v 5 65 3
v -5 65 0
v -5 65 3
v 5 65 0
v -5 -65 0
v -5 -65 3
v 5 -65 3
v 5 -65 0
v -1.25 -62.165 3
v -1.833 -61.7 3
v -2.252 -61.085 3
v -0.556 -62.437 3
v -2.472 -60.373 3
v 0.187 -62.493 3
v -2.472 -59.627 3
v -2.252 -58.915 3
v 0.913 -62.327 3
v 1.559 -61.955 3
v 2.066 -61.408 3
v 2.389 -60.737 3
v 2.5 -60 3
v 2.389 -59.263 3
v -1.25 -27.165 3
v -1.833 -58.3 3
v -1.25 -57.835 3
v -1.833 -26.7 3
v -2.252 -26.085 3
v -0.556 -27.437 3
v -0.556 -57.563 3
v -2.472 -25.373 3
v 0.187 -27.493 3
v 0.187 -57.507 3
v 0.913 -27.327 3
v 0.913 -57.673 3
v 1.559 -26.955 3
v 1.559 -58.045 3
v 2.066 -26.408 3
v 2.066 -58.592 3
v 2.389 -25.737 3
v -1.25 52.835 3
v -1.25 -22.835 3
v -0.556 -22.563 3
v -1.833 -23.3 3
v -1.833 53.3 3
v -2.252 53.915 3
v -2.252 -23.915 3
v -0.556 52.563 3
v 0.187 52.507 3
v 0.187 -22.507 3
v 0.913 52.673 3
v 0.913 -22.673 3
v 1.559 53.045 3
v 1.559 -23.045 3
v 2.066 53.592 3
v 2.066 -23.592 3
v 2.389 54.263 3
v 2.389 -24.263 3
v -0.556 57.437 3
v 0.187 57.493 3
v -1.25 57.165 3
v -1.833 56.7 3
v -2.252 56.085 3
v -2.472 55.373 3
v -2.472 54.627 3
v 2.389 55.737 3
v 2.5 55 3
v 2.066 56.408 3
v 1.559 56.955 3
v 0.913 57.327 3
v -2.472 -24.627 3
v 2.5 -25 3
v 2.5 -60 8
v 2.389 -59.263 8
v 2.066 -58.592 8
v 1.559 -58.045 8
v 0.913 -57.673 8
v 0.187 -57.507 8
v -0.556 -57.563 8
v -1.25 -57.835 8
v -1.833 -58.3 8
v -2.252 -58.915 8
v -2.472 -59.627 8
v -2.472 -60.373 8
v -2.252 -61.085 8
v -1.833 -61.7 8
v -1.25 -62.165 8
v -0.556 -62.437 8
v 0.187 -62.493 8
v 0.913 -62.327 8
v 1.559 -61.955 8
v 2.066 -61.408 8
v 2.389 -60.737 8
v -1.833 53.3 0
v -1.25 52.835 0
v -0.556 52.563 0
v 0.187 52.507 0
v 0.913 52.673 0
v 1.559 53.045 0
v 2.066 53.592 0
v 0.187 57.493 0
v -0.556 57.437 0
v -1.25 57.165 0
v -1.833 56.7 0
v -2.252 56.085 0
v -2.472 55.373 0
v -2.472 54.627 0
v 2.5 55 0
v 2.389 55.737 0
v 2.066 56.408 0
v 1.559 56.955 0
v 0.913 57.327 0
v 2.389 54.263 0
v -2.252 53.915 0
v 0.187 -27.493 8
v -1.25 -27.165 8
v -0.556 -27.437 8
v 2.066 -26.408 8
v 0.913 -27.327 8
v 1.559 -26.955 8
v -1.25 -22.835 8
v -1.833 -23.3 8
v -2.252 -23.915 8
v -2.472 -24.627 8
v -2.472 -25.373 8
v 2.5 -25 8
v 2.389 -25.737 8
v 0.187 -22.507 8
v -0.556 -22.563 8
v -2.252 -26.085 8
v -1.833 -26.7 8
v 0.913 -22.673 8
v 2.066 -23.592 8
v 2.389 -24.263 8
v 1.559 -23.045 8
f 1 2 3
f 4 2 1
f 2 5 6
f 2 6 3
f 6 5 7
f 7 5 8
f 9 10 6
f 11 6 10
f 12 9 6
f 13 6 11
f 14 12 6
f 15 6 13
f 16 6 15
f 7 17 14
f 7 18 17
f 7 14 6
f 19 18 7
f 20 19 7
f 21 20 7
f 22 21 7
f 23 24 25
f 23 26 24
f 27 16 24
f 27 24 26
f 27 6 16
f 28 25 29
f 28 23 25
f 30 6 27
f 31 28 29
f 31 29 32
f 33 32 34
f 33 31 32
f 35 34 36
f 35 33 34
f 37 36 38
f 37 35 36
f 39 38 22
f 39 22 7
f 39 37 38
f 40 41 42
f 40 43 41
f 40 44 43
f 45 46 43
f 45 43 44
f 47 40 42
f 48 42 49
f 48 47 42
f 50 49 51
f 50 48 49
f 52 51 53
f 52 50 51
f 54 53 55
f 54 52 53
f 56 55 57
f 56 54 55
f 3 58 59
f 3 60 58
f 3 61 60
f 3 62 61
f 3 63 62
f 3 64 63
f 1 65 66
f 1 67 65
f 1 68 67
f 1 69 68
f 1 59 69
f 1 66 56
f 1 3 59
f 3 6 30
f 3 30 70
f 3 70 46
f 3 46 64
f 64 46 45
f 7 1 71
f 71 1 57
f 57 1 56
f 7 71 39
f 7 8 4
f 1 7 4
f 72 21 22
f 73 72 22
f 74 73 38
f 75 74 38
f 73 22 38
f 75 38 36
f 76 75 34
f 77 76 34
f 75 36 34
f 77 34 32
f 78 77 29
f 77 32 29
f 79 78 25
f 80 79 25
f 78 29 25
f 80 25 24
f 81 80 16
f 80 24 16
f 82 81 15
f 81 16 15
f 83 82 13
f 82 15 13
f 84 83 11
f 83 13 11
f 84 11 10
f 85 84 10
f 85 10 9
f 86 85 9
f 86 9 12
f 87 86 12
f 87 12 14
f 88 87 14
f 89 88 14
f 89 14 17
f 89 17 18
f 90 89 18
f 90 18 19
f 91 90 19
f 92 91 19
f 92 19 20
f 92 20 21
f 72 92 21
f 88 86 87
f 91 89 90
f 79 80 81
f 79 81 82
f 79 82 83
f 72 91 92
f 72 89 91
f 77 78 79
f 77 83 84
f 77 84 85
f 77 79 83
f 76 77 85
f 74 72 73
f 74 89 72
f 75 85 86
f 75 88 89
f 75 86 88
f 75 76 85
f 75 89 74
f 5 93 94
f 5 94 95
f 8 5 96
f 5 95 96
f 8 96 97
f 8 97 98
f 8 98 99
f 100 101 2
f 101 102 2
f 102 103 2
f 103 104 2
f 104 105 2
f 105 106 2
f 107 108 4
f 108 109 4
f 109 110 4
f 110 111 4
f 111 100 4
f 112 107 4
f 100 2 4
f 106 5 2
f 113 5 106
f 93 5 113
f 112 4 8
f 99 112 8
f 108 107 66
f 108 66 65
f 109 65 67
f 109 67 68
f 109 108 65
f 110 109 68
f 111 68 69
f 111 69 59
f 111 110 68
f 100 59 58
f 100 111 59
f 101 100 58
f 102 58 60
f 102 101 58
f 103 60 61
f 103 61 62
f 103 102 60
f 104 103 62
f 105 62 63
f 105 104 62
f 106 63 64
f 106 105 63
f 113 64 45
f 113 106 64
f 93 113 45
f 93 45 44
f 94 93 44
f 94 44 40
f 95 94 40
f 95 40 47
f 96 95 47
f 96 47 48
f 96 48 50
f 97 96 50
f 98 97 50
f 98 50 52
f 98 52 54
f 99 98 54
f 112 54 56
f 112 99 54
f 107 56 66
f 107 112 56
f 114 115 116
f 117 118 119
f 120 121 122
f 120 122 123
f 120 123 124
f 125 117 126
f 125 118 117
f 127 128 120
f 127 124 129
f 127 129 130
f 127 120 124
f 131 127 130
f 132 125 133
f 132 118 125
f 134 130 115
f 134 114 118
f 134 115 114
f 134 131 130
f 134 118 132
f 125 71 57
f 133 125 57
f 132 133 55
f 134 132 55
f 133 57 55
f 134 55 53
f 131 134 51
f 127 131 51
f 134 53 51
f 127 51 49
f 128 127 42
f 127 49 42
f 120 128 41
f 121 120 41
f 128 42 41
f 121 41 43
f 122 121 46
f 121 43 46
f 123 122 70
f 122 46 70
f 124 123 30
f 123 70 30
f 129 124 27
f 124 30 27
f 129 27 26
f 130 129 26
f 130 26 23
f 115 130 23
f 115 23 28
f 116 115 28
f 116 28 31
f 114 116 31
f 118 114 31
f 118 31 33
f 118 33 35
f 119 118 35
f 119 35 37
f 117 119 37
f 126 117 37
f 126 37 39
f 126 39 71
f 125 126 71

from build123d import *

# Parameters (mm, degrees)
ESBO_O1_W                = 10
ESBO_O1_H                = 130
ESBO_O1_R                = 2.5
RESSALTO_EXTRUS_O1_DEPTH = 3
ESBO_O1_11_R             = 2.5
RESSALTO_EXTRUS_O7_DEPTH = 8


with BuildPart() as part:
    # Esboço1 → Ressalto-extrusão1 (new body)
    with BuildSketch(Plane.XY):
        Rectangle(ESBO_O1_W, ESBO_O1_H)
        with Locations((0, 55)):
            Circle(ESBO_O1_R, mode=Mode.SUBTRACT)
        with Locations((0, -60)):
            Circle(ESBO_O1_R, mode=Mode.SUBTRACT)
        with Locations((0, -25)):
            Circle(ESBO_O1_R, mode=Mode.SUBTRACT)
    extrude(amount=RESSALTO_EXTRUS_O1_DEPTH)

    # Esboço1<11> → Ressalto-extrusão7 (add)
    with BuildSketch(Plane.XY):
        with Locations((0, -25)):
            Circle(ESBO_O1_11_R)
        with Locations((0, -60)):
            Circle(ESBO_O1_11_R)
    extrude(amount=RESSALTO_EXTRUS_O7_DEPTH)


solid = part.part
